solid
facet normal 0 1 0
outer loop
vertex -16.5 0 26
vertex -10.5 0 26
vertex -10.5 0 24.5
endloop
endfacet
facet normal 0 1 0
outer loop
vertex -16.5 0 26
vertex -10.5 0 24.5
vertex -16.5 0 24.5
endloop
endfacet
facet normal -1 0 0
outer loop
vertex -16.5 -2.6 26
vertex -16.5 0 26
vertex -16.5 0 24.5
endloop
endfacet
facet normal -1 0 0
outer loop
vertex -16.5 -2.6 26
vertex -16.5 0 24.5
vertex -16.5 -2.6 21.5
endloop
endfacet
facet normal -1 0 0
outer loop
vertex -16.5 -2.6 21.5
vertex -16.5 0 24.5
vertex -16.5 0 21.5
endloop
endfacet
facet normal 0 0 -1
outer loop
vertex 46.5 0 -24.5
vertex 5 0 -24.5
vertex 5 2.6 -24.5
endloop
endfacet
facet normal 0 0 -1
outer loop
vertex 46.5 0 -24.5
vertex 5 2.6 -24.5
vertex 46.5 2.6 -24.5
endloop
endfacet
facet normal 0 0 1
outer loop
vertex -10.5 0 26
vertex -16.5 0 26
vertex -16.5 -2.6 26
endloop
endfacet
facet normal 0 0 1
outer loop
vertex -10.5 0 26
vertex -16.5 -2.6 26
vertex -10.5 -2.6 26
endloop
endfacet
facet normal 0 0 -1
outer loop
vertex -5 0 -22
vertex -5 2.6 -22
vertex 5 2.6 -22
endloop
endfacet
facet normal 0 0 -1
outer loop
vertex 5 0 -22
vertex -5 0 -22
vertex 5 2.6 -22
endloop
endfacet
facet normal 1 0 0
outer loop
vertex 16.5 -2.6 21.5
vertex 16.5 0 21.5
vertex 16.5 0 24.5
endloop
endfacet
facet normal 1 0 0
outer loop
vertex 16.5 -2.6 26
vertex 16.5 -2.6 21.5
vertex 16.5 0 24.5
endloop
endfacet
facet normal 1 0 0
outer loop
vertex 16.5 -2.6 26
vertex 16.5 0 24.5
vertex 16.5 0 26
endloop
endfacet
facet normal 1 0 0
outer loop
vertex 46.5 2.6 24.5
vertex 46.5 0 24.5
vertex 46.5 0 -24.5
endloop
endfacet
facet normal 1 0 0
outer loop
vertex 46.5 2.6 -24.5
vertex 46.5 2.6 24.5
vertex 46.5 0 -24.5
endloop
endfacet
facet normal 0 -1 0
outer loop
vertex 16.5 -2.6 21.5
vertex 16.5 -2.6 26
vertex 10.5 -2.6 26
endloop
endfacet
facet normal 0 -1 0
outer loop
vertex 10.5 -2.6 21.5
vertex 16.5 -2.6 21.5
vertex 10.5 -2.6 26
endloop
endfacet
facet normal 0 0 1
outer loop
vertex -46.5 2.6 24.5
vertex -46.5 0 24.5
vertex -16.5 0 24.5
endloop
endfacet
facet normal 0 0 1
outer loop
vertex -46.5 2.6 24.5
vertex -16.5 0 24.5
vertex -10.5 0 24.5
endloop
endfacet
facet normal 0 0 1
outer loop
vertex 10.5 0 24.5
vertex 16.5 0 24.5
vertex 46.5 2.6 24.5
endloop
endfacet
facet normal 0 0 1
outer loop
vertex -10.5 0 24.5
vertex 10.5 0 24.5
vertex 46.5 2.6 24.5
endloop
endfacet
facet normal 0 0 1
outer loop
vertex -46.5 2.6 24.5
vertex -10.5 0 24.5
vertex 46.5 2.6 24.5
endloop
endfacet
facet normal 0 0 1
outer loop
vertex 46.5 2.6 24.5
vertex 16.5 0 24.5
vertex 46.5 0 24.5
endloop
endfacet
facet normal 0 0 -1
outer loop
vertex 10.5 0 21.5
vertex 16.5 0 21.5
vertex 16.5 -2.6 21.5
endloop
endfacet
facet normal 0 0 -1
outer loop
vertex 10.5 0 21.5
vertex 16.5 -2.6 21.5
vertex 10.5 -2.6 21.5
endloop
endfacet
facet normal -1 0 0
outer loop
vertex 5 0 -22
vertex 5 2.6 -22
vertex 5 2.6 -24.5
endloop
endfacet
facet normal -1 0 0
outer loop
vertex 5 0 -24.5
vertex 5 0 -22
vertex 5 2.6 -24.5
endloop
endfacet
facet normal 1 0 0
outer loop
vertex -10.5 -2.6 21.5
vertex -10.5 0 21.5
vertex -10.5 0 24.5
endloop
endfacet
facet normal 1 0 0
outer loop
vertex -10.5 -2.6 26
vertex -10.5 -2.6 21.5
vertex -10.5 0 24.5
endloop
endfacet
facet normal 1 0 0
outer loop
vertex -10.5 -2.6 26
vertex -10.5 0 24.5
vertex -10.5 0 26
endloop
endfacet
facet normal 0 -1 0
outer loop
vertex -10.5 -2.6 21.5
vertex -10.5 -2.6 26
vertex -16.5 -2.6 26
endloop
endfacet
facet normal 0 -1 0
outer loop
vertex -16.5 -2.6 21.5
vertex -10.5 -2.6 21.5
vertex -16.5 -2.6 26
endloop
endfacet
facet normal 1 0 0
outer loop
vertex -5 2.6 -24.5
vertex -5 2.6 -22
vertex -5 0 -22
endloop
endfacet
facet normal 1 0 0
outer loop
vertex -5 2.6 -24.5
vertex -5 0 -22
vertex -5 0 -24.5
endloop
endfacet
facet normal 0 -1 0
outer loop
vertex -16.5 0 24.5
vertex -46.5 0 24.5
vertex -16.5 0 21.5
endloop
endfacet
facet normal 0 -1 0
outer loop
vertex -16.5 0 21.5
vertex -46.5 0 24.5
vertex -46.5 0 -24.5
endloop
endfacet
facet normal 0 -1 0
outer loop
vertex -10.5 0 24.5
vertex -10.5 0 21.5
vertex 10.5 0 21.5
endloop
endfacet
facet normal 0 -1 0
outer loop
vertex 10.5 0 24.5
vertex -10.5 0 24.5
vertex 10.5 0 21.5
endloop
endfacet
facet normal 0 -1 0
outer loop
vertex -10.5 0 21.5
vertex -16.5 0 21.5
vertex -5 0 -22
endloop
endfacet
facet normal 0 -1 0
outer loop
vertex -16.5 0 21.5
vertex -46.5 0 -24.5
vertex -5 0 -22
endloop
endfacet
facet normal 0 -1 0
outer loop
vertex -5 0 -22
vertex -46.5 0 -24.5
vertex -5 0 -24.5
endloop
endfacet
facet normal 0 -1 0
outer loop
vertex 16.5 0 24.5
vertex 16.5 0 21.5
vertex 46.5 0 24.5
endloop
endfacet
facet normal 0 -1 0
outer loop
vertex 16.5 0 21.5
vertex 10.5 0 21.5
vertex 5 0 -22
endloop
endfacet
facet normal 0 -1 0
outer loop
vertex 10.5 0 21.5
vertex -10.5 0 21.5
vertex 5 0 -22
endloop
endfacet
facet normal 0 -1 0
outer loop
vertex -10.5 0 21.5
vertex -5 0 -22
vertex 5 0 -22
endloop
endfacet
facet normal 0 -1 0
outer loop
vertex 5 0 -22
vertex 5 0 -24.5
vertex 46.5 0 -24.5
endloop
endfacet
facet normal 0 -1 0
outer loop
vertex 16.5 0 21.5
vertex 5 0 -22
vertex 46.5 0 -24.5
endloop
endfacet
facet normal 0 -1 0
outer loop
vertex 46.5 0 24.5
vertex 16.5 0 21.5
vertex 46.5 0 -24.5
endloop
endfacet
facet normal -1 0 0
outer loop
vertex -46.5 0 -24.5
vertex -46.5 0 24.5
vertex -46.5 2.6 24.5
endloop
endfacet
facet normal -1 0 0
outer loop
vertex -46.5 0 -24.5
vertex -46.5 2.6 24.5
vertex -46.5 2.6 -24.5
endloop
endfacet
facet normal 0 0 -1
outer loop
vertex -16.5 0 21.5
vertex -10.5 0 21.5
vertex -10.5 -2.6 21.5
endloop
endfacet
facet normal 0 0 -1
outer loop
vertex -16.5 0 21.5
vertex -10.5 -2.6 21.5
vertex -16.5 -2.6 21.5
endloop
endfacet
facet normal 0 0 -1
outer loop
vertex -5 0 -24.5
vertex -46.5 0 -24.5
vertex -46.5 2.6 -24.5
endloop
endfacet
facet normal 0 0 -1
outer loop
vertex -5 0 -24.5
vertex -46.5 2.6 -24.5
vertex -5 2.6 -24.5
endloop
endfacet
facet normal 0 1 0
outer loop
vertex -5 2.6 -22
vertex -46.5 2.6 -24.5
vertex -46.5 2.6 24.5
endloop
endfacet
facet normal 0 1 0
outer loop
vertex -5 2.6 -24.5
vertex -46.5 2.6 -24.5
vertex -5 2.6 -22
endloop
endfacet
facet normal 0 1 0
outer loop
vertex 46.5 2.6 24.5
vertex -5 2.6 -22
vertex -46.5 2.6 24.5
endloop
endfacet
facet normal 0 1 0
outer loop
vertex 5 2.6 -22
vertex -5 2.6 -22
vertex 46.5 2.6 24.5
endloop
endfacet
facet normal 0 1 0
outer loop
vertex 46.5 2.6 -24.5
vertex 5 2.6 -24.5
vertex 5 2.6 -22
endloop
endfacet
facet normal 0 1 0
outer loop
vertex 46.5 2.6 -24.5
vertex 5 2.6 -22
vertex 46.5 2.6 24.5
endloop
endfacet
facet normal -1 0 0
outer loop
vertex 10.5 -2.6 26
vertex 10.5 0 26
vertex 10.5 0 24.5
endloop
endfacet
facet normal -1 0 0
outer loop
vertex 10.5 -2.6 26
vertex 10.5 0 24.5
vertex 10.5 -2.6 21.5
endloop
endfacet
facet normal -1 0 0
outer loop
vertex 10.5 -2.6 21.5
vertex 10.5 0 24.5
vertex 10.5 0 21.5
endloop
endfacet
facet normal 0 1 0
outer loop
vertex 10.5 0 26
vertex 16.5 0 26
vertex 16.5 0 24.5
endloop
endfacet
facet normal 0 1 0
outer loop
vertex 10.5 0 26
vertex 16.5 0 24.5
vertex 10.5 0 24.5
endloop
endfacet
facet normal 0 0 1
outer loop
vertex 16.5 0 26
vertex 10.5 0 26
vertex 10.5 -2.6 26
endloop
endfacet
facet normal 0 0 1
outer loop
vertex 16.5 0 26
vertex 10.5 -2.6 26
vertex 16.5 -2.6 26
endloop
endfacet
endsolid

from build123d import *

# Parameters (mm, degrees)
SKETCH1_W           = 93
SKETCH1_H           = 49
BOSS_EXTRUDE1_DEPTH = 2.6
SKETCH2_W           = 10
SKETCH2_H           = 2.5
CUT_EXTRUDE1_DEPTH  = 2.6
BOSS_EXTRUDE2_DEPTH = 2.6


with BuildPart() as part:
    # Sketch1 → Boss-Extrude1 (new body)
    with BuildSketch(Plane(origin=(0, 0, 0), x_dir=(1, 0, 0), z_dir=(0, 1, 0))):
        Rectangle(SKETCH1_W, SKETCH1_H)
    extrude(amount=BOSS_EXTRUDE1_DEPTH)

    # Sketch2 → Cut-Extrude1 (cut)
    with BuildSketch(Plane(origin=(0, 2.6, 0), x_dir=(1, 0, 0), z_dir=(0, 1, 0))):
        with Locations((0, 23.25)):
            Rectangle(SKETCH2_W, SKETCH2_H)
    extrude(amount=-CUT_EXTRUDE1_DEPTH, mode=Mode.SUBTRACT)

    # Sketch3 → Boss-Extrude2 (add)
    with BuildSketch(Plane.XZ):
        Polygon((-16.5, 23), (-16.5, 26), (-10.5, 26), (-10.5, 23), (-10.5, 21.5), (-16.5, 21.5), align=None)
        Polygon((10.5, 23), (10.5, 26), (16.5, 26), (16.5, 23), (16.5, 21.5), (10.5, 21.5), align=None)
    extrude(amount=BOSS_EXTRUDE2_DEPTH)


solid = part.part
